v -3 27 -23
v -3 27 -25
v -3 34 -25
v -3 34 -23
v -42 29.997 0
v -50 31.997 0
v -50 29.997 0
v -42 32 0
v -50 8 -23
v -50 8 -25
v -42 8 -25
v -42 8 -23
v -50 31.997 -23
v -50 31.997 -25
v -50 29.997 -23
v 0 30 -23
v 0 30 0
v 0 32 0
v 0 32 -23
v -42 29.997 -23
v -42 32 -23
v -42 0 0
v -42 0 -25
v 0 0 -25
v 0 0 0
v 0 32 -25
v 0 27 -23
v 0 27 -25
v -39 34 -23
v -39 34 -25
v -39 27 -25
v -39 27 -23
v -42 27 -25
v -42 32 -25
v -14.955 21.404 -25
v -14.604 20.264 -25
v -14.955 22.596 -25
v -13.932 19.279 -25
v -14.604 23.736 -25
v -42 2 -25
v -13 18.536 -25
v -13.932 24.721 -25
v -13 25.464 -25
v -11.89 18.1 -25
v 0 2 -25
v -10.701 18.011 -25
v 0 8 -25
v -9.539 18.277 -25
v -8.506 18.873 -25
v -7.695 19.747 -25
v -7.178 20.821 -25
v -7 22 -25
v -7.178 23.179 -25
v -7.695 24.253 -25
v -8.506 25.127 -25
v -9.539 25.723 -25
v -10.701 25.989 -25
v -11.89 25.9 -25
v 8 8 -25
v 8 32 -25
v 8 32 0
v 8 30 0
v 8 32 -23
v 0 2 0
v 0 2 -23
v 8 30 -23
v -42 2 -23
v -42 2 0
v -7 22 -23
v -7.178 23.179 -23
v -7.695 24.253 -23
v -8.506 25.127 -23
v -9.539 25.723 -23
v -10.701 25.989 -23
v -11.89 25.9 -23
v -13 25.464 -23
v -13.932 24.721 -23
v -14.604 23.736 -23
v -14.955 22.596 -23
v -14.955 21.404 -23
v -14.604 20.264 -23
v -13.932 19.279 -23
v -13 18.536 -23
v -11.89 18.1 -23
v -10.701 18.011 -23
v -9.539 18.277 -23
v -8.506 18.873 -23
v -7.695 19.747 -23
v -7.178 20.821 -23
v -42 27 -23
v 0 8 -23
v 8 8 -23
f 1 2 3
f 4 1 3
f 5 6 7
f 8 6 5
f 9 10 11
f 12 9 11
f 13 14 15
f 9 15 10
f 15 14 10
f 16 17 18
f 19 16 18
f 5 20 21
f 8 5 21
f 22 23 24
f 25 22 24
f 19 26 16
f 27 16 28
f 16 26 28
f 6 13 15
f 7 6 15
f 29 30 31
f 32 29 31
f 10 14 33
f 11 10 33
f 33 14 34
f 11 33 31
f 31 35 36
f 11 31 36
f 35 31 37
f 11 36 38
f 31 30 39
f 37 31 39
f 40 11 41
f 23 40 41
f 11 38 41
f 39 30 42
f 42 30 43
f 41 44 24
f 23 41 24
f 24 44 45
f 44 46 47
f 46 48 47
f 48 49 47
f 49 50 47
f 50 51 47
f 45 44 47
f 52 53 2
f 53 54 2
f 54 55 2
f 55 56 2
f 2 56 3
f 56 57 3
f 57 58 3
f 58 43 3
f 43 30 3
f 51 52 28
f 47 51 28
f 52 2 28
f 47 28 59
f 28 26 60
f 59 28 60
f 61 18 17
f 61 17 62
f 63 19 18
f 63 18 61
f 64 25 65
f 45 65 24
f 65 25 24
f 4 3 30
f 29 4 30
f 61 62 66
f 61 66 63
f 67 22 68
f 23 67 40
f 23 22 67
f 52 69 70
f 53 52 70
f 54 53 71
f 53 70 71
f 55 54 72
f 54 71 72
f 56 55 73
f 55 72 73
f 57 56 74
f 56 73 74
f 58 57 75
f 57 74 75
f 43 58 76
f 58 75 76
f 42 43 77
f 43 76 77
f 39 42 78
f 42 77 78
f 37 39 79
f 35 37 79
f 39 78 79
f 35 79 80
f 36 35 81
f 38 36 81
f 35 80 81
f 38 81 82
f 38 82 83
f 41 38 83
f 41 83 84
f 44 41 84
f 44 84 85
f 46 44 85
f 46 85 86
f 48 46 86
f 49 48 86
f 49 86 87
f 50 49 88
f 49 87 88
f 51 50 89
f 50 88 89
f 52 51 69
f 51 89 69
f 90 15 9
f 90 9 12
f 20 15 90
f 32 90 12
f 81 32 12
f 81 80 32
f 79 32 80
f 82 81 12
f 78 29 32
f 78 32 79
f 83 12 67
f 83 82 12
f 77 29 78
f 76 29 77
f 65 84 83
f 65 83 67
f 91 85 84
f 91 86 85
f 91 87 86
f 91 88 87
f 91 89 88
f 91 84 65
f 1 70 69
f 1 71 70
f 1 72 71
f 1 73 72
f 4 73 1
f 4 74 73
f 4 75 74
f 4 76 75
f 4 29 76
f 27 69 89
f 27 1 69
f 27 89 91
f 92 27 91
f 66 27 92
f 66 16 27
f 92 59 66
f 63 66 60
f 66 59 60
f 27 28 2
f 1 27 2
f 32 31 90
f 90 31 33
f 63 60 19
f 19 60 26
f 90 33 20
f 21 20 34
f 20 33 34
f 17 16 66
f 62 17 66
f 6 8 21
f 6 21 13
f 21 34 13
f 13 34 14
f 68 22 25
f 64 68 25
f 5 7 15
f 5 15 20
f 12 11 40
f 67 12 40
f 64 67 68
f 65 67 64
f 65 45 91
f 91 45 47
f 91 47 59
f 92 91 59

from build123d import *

# Parameters (mm, degrees)
SKETCH1_W           = 42
SKETCH1_H           = 25
BOSS_EXTRUDE1_DEPTH = 2
BOSS_EXTRUDE2_DEPTH = 2
SKETCH2_R           = 4
CUT_EXTRUDE1_DEPTH  = 2
SKETCH3_W           = 8
SKETCH3_H           = 2
BOSS_EXTRUDE3_DEPTH = 23


with BuildPart() as part:
    # Sketch1 → Boss-Extrude1 (new body)
    with BuildSketch(Plane(origin=(0, 0, 0), x_dir=(1, 0, 0), z_dir=(0, 1, 0))):
        with Locations((-21, 12.5)):
            Rectangle(SKETCH1_W, SKETCH1_H)
    extrude(amount=BOSS_EXTRUDE1_DEPTH)

    # 3DSketch1 → Boss-Extrude2 (add)
    with BuildSketch(Plane(origin=(0, 2, -25), x_dir=(-0.8575119035010357, 0.5144641244577025, 0), z_dir=(0, 0, -1))):
        Polygon((0, 0), (3.086784747, 5.145071421), (-3.773310481, 9.260784417), (8.573828506, 29.841070101), (15.433923734, 25.725357105), (12.861603111, 21.437797588), (15.434138822, 19.894405214), (19.035387693, 25.896988539), (49.905816556, 7.376279856), (46.304567685, 1.373696531), (48.877103396, -0.169695842), (51.449424018, 4.117863675), (58.308228487, 0), (45.962379922, -20.578134802), (39.102284694, -16.462421806), (36.015499947, -21.607493227), align=None)
    extrude(amount=-BOSS_EXTRUDE2_DEPTH)

    # Sketch2 → Cut-Extrude1 (cut)
    with BuildSketch(Plane.XY.offset(-23)):
        with Locations((-11, 22)):
            Circle(SKETCH2_R)
    extrude(amount=-CUT_EXTRUDE1_DEPTH, mode=Mode.SUBTRACT)

    # Sketch3 → Boss-Extrude3 (add)
    with BuildSketch(Plane.XY.offset(-23)):
        Polygon((-50, 31.997491717), (-50, 29.997491717), (-42.000000393, 29.997491717), (-42.000000393, 32), align=None)
        with Locations((4, 31)):
            Rectangle(SKETCH3_W, SKETCH3_H)
    extrude(amount=BOSS_EXTRUDE3_DEPTH)


solid = part.part
